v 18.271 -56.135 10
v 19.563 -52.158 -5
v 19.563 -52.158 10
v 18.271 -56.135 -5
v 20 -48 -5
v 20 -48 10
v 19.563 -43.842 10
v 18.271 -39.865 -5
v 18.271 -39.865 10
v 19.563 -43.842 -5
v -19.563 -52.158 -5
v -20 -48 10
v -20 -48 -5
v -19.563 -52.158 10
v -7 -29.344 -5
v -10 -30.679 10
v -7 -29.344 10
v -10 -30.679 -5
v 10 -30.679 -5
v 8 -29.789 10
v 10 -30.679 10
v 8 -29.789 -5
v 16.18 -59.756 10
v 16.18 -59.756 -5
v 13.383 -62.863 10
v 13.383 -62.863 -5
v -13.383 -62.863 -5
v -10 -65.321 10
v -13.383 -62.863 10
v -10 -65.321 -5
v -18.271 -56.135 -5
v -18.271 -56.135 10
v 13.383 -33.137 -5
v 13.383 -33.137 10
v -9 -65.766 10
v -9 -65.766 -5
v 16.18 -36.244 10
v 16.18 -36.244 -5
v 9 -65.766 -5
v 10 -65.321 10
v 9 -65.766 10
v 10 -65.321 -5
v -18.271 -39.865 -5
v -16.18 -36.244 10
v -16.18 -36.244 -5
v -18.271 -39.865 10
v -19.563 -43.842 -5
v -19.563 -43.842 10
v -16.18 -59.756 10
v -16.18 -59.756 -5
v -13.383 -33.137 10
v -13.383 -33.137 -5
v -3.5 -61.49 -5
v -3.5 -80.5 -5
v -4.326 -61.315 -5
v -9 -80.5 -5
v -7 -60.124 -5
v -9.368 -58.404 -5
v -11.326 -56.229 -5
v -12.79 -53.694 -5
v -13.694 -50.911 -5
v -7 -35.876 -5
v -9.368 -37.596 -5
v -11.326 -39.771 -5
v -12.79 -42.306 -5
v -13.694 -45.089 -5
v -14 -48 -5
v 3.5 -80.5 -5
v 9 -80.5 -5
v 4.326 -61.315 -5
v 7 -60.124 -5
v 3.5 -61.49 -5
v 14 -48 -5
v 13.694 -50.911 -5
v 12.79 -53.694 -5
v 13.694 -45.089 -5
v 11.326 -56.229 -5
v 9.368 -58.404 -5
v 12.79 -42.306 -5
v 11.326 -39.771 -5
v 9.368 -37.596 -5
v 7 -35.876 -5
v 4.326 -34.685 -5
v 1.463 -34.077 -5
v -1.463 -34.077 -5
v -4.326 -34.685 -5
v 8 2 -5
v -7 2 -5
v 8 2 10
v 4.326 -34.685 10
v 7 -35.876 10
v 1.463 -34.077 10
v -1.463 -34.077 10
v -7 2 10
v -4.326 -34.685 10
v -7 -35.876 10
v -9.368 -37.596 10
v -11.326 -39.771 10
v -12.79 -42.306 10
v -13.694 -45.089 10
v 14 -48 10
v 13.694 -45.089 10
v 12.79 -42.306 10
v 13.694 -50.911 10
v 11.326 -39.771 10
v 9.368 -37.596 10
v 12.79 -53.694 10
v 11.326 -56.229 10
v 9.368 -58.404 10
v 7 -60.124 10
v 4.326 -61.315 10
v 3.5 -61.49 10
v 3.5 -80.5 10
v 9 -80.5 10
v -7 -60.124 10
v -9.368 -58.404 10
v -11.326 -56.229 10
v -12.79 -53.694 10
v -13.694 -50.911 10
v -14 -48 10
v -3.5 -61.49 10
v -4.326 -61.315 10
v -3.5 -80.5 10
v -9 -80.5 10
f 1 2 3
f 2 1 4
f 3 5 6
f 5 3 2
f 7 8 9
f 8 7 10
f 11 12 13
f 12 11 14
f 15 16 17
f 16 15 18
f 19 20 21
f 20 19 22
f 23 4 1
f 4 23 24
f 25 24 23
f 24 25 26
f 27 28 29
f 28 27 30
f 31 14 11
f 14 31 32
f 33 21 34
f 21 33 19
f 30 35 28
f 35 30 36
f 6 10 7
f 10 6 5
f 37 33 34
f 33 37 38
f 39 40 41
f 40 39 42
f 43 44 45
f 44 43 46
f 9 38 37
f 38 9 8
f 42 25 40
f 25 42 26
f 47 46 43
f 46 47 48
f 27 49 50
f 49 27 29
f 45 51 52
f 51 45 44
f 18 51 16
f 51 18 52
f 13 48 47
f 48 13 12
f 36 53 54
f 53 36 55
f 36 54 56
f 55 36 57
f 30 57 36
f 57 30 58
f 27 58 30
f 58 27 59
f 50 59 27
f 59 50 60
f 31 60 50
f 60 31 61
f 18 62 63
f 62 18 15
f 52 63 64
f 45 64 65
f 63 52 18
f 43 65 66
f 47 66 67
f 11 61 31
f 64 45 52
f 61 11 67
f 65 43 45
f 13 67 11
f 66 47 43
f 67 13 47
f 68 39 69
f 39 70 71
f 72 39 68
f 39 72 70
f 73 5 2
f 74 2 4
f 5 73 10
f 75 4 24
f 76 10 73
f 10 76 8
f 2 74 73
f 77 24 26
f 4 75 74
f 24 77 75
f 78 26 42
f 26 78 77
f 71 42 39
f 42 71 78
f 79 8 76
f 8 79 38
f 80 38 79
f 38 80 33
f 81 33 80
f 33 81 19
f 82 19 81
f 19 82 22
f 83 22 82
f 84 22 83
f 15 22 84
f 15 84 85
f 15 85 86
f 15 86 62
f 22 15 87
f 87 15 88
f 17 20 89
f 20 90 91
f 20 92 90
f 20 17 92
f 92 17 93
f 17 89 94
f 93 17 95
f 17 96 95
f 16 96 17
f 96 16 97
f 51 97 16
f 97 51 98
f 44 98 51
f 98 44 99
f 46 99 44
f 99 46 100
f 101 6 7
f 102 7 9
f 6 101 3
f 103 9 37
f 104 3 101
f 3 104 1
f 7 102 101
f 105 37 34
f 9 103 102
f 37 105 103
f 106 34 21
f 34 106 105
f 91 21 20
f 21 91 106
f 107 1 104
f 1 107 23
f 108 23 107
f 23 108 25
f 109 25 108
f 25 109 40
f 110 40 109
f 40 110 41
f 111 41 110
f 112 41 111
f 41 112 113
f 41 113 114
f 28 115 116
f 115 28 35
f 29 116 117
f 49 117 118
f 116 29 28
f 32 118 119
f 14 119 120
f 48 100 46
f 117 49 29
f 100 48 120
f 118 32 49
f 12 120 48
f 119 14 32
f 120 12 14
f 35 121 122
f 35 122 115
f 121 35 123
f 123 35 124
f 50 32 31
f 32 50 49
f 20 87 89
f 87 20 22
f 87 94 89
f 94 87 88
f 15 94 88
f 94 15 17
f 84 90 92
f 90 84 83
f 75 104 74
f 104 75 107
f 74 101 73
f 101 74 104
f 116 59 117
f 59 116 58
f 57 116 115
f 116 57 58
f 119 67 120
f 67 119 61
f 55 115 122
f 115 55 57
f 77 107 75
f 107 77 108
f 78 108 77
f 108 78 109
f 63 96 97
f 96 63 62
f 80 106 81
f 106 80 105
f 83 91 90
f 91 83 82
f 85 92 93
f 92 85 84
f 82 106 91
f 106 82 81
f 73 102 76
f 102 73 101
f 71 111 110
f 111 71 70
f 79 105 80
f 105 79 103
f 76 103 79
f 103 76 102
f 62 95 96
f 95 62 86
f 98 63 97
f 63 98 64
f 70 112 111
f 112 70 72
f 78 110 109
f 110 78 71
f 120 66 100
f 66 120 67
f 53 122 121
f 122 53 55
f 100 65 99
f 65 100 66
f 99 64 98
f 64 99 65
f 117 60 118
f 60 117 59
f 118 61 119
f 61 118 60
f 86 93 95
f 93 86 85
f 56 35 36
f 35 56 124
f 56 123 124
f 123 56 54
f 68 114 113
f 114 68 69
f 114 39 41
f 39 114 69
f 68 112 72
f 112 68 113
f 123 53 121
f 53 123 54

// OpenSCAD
//rotace pro tisk
rotate ([90,0,0]){


difference() 
{ 
// ode�et distan�n� mezery


union() 
{
// p�i�ten� patic pro sta�en�

difference() 
{ 
// diffference pro  otvor pro osazen� na ty�



union() 
{
// union pro v�lec napojen� na cylinder pro zasazen� do rukojeti

union() 
// union pro p�ipojen� cylinderu na v�lec
{


//cylinder(h = 14, r1 = 17, r2 = 10, center = true); 
//cylinder-nepouzite skoseni napojeni tyce pro usazeni v rukojeti

//zakladn�
translate([0,10,48]) rotate ([90,0,0])cylinder(h = 15, r=20);
// 40 je nastavena vnitrni prumer na 35 a vnejsi na 40
        
} 
#translate([-7,-5,-2]) cube([15,15,35], center = false);

//tloustka upnut� 15mm 
// umisteni ctverce pro dosazeni do rukojeti
//tloustka operky je 4mm + 14mm pro zesileni
//19 je posun nahoru a dolu/////35 vyska propojky
}
translate([0,10,48]) rotate ([90,0,0])cylinder(h = 20, r=14);
// odecitaci valec pro otvor na osazen� ty�e
}
translate([0,2.5,73]) rotate ([90,0,0]) cube(size = [18,15,15], center = true);
//sloupky pro utazeni
}
translate([0,10,75]) rotate ([0,0,0])cube(size = [7,50,40], center = true);
//odecet distancni mezery
}        







} 


//# pro zviditeleneni
//priblizeni shift+prav tlacitko mysi+ pousouvani dopredu/dozadu
